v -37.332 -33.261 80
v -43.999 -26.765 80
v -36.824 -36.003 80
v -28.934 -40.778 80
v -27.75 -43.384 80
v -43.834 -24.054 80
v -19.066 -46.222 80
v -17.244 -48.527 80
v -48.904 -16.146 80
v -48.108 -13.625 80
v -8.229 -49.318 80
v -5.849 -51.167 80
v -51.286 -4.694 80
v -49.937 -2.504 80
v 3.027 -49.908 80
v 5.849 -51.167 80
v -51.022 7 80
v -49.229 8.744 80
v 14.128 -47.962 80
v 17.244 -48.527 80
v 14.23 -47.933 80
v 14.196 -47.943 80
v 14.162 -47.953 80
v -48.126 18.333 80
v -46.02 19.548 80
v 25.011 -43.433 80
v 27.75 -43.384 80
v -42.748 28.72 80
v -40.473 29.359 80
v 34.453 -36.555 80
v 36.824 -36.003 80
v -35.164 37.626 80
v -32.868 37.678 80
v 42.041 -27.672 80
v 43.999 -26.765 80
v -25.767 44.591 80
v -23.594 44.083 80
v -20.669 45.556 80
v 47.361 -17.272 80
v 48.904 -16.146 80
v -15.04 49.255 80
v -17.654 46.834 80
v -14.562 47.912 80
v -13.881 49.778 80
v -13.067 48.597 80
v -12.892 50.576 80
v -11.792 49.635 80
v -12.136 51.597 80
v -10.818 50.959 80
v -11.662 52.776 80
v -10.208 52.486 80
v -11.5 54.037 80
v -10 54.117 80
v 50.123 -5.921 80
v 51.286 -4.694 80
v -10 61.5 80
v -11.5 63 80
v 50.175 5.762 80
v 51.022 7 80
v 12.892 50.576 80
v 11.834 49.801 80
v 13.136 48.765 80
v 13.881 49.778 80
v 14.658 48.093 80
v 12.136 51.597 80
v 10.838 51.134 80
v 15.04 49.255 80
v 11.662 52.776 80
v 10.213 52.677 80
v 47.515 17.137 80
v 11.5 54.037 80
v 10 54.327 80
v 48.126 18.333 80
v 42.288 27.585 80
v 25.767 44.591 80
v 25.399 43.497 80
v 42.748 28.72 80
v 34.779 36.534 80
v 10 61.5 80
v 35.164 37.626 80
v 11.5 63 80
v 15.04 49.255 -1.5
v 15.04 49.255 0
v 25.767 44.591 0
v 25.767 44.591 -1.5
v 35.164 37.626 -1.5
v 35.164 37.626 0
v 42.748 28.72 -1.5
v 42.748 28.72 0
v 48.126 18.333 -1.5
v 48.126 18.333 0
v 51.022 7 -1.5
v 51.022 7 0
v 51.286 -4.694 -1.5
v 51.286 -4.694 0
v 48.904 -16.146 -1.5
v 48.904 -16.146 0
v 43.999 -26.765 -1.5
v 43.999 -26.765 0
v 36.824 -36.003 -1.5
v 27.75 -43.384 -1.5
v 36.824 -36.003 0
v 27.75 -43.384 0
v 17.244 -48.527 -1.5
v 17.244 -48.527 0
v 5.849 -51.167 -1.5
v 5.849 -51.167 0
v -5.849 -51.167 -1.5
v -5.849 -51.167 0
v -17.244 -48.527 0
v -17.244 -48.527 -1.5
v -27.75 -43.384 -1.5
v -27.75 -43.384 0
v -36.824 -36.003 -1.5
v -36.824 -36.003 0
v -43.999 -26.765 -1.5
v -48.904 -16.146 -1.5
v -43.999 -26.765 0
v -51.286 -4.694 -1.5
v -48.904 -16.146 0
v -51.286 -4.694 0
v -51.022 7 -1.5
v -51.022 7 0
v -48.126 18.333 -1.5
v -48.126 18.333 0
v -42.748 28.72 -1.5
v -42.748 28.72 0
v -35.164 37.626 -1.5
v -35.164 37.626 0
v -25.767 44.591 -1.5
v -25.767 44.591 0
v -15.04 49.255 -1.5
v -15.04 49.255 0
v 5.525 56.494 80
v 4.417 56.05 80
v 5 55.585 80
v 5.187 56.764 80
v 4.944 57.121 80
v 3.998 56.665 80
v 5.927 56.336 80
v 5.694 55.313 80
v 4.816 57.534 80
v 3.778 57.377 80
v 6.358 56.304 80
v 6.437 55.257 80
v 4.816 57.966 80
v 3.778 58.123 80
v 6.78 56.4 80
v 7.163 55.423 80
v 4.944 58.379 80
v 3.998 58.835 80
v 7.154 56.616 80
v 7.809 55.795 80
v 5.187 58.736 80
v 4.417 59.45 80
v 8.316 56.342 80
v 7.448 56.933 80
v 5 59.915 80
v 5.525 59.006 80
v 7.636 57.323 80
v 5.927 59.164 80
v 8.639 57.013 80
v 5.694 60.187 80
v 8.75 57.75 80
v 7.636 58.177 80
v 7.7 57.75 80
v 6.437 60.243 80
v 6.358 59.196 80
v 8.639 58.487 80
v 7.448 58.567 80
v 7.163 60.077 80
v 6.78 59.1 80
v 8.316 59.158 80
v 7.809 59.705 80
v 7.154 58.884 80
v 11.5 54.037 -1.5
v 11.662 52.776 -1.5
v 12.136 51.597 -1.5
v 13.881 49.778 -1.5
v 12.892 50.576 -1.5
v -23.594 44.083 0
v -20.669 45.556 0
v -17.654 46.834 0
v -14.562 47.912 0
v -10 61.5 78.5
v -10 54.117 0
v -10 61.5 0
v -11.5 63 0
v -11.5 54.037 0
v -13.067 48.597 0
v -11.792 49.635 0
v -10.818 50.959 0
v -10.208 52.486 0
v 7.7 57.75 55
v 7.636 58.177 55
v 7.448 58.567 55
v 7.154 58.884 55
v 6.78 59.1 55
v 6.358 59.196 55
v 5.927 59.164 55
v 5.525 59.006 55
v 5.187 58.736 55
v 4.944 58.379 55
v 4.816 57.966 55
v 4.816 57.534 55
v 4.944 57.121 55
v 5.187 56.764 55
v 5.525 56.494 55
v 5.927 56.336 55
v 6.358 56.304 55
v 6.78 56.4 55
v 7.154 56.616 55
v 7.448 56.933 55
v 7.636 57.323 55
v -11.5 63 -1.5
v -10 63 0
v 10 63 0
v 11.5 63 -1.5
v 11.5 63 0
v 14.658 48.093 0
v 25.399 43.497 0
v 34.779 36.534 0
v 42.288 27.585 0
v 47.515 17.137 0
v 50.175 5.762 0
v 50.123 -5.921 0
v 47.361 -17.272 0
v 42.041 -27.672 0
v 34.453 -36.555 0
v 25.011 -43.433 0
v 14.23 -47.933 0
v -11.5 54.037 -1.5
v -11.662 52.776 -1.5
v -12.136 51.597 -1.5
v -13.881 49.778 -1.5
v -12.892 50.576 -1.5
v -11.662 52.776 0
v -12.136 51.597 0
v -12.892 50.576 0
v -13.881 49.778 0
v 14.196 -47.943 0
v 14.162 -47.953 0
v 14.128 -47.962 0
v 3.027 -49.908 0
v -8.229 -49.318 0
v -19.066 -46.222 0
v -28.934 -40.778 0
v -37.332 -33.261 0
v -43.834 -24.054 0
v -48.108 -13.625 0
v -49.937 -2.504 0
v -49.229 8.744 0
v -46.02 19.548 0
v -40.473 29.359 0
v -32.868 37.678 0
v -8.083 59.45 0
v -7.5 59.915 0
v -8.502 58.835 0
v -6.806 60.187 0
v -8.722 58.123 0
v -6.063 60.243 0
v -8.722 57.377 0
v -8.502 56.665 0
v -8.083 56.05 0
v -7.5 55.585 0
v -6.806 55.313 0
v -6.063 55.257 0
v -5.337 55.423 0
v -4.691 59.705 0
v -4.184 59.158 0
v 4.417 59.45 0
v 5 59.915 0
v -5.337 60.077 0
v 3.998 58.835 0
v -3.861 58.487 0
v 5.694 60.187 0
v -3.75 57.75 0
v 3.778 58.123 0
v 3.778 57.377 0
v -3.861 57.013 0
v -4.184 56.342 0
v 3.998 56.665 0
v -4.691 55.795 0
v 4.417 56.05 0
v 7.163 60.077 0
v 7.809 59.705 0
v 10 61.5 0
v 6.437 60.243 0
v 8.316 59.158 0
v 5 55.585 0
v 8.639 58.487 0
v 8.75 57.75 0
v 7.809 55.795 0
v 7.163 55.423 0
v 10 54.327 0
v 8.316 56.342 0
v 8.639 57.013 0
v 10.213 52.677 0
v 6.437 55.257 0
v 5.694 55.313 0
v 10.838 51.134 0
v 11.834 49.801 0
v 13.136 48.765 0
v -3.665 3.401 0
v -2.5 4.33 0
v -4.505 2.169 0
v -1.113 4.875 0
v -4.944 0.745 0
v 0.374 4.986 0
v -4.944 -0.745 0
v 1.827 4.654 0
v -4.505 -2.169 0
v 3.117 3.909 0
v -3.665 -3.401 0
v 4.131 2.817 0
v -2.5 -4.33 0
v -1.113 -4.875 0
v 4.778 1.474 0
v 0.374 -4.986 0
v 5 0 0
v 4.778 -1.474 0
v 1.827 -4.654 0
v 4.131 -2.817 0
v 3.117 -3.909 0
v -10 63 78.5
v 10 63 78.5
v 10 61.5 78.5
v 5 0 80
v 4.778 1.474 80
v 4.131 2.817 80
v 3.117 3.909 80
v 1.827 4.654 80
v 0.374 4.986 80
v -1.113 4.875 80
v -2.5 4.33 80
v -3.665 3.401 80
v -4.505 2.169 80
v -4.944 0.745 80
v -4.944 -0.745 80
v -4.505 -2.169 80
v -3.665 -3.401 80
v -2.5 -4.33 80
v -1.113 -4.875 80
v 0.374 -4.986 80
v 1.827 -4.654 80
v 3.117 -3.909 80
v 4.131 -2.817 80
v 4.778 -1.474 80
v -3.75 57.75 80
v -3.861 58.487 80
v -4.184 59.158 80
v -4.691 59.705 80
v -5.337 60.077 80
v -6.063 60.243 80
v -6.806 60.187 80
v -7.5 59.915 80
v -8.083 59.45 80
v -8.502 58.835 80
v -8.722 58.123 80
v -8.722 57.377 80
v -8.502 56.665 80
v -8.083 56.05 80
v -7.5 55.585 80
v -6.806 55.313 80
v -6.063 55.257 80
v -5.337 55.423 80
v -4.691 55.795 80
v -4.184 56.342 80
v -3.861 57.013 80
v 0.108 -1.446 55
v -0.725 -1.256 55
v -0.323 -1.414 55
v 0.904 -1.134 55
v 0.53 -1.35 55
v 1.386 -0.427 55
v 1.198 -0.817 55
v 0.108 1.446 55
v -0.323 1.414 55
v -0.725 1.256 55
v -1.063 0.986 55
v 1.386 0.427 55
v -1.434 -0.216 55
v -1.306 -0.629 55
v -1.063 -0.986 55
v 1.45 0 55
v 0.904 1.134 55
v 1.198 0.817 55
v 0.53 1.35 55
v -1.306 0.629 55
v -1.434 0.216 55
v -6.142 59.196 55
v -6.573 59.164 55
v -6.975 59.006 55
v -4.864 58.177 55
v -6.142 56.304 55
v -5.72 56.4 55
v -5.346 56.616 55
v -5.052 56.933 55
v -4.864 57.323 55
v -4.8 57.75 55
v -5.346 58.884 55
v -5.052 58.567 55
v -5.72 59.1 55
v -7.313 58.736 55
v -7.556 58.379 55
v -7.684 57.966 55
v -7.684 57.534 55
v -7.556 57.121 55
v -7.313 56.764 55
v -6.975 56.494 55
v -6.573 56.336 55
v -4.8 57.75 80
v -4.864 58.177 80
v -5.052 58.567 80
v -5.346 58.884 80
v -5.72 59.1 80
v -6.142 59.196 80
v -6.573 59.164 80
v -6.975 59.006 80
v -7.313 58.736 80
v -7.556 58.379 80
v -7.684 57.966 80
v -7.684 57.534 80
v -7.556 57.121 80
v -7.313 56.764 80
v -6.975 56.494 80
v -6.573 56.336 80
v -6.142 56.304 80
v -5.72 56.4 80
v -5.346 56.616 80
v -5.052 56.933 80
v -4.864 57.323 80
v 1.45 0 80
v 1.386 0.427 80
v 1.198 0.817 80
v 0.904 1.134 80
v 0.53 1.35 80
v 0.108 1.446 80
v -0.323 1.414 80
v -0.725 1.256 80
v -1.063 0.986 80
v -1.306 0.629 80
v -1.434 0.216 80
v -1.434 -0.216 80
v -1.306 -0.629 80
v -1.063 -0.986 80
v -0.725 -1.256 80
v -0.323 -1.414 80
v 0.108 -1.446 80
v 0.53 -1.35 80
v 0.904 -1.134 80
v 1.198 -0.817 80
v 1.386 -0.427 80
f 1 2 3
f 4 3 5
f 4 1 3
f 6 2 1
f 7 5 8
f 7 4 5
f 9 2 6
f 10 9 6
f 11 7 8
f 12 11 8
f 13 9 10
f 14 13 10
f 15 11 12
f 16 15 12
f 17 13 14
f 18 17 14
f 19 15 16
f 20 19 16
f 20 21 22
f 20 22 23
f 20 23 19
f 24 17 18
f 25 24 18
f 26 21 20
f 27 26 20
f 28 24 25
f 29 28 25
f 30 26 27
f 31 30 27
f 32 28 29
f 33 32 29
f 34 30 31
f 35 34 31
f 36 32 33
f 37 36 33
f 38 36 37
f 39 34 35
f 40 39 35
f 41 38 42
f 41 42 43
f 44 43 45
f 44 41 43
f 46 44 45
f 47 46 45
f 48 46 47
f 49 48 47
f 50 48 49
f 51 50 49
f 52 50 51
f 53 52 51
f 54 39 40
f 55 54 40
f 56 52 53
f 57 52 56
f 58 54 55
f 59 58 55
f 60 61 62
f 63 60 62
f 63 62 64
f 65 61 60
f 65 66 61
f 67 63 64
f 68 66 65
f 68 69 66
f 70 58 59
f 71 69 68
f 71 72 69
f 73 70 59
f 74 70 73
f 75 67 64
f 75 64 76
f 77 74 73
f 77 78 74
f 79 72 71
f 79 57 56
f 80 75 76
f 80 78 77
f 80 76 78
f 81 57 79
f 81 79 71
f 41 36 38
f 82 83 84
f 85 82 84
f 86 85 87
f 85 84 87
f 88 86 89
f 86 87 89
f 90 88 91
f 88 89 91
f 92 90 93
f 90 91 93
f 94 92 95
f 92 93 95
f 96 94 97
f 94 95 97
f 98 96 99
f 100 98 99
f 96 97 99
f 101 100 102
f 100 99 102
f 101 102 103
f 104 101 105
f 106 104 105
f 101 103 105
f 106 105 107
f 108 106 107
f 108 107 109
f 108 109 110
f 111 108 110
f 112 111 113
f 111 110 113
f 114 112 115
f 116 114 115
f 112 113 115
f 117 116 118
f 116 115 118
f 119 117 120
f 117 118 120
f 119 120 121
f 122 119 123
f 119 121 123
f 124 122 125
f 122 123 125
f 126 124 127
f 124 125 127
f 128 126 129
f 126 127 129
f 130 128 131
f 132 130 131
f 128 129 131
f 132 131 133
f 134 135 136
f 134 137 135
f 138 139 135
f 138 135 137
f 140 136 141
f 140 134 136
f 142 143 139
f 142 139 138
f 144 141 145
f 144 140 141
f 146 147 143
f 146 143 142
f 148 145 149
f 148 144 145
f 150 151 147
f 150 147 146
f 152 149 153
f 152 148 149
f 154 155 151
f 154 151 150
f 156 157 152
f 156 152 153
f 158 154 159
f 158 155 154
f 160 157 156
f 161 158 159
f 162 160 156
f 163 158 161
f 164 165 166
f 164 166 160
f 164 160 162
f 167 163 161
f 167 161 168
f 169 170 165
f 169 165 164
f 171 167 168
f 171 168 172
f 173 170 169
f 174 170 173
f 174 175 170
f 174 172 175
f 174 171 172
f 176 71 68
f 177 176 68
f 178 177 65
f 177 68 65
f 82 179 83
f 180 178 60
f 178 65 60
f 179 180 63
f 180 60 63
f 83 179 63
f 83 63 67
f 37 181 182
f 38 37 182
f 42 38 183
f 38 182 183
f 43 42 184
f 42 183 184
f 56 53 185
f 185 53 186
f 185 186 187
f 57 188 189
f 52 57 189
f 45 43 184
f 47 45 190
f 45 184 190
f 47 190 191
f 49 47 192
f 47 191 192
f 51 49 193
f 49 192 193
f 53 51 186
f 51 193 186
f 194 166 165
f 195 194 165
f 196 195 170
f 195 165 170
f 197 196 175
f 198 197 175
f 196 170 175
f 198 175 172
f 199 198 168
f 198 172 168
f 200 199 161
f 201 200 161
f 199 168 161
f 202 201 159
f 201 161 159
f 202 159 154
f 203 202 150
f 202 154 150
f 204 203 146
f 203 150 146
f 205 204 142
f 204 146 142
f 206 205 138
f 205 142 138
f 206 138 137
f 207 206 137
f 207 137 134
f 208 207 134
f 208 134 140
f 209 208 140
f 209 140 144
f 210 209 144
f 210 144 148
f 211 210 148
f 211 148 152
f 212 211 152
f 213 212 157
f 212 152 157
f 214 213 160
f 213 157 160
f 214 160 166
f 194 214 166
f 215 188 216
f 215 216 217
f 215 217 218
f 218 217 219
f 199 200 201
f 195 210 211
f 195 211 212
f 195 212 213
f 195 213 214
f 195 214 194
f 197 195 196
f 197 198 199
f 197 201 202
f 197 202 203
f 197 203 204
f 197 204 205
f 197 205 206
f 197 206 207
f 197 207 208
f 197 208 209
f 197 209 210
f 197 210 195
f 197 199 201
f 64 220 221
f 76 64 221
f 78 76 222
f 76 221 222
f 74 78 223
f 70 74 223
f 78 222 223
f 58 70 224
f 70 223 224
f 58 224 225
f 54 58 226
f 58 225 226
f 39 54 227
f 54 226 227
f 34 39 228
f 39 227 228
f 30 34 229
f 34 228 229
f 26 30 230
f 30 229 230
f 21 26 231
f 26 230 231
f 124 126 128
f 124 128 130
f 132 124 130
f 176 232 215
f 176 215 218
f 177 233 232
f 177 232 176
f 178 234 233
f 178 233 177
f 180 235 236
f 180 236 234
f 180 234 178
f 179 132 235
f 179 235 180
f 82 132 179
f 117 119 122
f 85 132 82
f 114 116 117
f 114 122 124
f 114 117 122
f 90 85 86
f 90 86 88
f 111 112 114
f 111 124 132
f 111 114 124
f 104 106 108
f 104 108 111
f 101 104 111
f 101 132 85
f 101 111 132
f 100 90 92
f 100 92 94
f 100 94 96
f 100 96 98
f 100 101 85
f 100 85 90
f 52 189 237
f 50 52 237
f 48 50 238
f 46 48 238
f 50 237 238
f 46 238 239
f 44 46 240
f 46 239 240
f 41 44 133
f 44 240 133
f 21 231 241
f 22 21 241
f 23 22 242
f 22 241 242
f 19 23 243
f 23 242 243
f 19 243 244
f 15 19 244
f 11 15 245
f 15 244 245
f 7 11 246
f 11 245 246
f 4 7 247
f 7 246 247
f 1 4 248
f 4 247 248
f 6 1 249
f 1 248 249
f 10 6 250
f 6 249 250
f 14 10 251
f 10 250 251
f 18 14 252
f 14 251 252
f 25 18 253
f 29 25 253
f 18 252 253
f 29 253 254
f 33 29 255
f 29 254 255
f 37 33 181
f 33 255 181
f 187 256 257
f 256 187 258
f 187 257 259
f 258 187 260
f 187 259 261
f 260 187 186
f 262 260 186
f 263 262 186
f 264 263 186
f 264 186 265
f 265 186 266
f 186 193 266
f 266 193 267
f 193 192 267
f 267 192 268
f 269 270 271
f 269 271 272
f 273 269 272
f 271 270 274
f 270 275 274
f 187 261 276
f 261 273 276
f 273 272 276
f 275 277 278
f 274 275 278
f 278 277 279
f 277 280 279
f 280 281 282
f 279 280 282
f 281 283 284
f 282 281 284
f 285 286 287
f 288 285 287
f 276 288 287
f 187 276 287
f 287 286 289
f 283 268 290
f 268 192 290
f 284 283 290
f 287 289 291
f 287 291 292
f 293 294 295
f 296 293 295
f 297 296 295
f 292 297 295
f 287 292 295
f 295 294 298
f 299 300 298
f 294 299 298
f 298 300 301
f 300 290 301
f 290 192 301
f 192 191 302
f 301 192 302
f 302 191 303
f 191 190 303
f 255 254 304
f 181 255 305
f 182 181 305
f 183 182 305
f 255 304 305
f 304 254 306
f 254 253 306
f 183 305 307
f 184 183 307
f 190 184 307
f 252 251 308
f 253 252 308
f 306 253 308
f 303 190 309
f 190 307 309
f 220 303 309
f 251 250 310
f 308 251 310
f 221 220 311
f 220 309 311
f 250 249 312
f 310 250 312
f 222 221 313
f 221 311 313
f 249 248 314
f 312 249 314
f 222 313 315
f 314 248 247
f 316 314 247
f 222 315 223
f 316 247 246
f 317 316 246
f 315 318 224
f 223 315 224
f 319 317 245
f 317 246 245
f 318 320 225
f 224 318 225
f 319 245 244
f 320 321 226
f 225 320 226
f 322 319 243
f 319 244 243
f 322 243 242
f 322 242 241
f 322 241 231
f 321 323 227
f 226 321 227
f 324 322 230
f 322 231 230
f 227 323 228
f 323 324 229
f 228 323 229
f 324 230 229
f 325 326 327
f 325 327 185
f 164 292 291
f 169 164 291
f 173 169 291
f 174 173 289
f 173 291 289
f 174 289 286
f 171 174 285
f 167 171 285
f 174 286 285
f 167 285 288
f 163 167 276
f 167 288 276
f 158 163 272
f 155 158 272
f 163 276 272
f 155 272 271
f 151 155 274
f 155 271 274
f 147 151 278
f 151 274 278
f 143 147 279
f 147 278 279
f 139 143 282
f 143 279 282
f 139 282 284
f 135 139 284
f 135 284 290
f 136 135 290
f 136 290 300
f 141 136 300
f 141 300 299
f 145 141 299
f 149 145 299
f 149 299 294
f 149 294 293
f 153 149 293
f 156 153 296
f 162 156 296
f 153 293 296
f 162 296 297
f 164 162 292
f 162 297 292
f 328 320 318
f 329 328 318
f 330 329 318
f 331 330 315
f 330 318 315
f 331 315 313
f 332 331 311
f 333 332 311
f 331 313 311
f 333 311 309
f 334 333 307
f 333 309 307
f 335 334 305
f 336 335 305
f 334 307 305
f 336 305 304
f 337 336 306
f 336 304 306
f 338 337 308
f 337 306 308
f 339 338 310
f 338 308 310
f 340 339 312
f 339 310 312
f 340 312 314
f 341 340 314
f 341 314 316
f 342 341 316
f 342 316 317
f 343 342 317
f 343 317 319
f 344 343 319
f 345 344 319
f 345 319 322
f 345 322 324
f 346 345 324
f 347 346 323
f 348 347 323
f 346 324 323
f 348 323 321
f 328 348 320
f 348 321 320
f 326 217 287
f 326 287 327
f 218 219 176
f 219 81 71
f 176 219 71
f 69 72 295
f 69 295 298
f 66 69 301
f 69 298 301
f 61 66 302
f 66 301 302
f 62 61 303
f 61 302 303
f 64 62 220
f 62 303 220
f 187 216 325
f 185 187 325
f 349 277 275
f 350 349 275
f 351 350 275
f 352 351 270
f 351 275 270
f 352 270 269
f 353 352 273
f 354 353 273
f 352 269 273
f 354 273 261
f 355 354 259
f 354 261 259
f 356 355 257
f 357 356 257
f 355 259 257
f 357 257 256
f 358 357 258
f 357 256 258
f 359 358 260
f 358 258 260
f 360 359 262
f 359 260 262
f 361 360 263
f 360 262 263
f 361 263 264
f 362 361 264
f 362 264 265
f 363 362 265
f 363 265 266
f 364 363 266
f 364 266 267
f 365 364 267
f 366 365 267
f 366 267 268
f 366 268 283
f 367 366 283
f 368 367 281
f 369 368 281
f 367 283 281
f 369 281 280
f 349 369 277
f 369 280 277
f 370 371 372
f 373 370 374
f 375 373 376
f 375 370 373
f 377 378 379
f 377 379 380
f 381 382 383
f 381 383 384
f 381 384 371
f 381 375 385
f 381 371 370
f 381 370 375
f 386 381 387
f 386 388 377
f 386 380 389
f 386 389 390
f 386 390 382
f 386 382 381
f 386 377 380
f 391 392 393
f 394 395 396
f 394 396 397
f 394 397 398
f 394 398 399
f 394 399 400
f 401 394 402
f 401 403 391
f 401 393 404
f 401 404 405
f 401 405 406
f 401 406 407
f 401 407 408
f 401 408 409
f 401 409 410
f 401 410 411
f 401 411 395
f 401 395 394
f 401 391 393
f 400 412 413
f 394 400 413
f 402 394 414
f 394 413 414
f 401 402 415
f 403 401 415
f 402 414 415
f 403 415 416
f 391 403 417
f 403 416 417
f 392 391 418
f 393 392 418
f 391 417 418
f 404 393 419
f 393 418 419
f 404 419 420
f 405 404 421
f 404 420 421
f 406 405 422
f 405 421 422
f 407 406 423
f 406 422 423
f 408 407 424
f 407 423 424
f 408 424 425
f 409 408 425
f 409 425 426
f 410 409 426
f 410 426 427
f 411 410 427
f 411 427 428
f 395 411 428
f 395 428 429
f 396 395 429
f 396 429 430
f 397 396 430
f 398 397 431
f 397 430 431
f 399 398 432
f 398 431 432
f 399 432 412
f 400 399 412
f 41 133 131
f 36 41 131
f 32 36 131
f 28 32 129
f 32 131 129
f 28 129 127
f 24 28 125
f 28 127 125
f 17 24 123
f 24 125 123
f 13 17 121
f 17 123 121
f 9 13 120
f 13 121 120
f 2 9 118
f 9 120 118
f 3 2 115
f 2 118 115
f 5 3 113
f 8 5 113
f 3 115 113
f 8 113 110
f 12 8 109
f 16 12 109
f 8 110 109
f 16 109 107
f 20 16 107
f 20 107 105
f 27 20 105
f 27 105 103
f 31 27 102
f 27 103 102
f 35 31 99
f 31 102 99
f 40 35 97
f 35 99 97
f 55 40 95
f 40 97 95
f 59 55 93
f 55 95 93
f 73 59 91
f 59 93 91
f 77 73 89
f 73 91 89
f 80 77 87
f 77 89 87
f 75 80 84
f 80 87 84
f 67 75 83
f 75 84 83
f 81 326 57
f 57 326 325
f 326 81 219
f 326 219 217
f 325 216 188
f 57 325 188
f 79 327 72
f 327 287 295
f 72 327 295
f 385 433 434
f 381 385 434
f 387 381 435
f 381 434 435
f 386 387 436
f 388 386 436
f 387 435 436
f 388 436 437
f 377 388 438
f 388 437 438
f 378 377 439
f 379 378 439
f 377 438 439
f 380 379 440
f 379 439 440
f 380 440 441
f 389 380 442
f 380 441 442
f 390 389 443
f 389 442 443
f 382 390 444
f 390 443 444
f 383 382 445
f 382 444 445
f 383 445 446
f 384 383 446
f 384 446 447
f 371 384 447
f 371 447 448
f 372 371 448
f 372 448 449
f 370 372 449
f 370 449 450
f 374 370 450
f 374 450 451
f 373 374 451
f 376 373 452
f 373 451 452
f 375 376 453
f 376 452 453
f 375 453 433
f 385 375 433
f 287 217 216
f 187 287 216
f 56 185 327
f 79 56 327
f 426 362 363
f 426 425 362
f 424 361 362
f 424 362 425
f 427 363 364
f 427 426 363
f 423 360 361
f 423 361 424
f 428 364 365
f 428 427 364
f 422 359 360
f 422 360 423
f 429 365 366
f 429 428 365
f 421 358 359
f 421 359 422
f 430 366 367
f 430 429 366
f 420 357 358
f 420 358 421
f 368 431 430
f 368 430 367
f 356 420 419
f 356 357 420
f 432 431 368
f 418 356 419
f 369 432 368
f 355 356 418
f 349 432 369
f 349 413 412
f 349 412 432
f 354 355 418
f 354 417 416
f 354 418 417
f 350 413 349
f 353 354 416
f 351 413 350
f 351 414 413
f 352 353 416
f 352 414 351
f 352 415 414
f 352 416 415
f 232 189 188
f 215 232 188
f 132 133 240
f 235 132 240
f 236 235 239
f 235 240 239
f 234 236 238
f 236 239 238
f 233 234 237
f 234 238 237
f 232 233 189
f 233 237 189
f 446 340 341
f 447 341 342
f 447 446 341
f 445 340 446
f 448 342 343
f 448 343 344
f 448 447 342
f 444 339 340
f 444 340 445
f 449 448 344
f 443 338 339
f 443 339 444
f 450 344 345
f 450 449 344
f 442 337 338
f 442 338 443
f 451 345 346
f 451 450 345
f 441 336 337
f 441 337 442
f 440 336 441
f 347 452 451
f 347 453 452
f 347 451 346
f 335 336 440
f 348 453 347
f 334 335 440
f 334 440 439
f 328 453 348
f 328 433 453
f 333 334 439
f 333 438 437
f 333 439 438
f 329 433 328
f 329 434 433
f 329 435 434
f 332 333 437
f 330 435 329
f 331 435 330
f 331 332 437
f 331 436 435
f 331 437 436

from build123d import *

# Parameters (mm, degrees)
F0_R     = 2.5
F0_R_2   = 5
F1_DEPTH = 80
F3_DEPTH = 1.5
F4_W     = 20
F4_H     = 78.5
F5_DEPTH = 1.5
F6_R     = 1.45
F7_DEPTH = 25


with BuildPart() as f1:
    # F0 (on Top) → F1 (new body)
    with BuildSketch(Plane.XY):
        with BuildLine():
            ThreePointArc((-11.5, 54.037024), (-12.481239, 51.062204), (-15.039823, 49.254987))
            ThreePointArc((-15.039823, 49.254987), (0, -51.5), (15.039823, 49.254987))
            ThreePointArc((15.039823, 49.254987), (12.481239, 51.062204), (11.5, 54.037024))
            Line((11.5, 54.037024), (11.5, 63))
            Line((11.5, 63), (-11.5, 63))
            Line((-11.5, 63), (-11.5, 54.037024))
        make_face()
        with BuildLine():
            ThreePointArc((14.128187, -47.962426), (-46.265444, -18.960715), (-23.594284, 44.082987))
            ThreePointArc((-23.594284, 44.082987), (-19.172369, 46.219688), (-14.562166, 47.912278))
            ThreePointArc((-14.562166, 47.912278), (-11.263306, 50.266106), (-10, 54.116696))
            Line((-10, 54.116696), (-10, 61.5))
            Line((-10, 61.5), (10, 61.5))
            Line((10, 61.5), (10, 54.326904))
            ThreePointArc((10, 54.326904), (11.293239, 50.435935), (14.658351, 48.093259))
            ThreePointArc((14.658351, 48.093259), (50.491326, -0.080985), (14.229822, -47.933499))
            ThreePointArc((14.229822, -47.933499), (14.179012, -47.94799), (14.128187, -47.962426))
        make_face(mode=Mode.SUBTRACT)
        with Locations((-6.25, 57.75)):
            Circle(F0_R)
        with Locations((6.25, 57.75)):
            Circle(F0_R)
        Circle(F0_R_2)
    extrude(amount=F1_DEPTH)

    # F2 (on face) → F3 (join)
    with BuildSketch(Plane(origin=(0, 0, 0), x_dir=(1, 0, 0), z_dir=(0, 0, -1))):
        with BuildLine():
            ThreePointArc((11.5, -54.037024), (12.481239, -51.062204), (15.039823, -49.254987))
            ThreePointArc((15.039823, -49.254987), (0, 51.5), (-15.039823, -49.254987))
            ThreePointArc((-15.039823, -49.254987), (-12.481239, -51.062204), (-11.5, -54.037024))
            Line((-11.5, -54.037024), (-11.5, -63))
            Line((-11.5, -63), (11.5, -63))
            Line((11.5, -63), (11.5, -54.037024))
        make_face()
    extrude(amount=F3_DEPTH)

    # F4 (on face) → F5 (cut, through all)
    with BuildSketch(Plane(origin=(0, 63, 0), x_dir=(-1, 0, 0), z_dir=(0, 1, 0))):
        with Locations((0, 39.25)):
            Rectangle(F4_W, F4_H)
    extrude(amount=-F5_DEPTH, mode=Mode.SUBTRACT)

    # F6 (on face) → F7 (cut)
    with BuildSketch(Plane.XY.offset(80)):
        Circle(F6_R)
        with Locations((-6.25, 57.75)):
            Circle(F6_R)
        with Locations((6.25, 57.75)):
            Circle(F6_R)
    extrude(amount=-F7_DEPTH, mode=Mode.SUBTRACT)


solid = f1.part
